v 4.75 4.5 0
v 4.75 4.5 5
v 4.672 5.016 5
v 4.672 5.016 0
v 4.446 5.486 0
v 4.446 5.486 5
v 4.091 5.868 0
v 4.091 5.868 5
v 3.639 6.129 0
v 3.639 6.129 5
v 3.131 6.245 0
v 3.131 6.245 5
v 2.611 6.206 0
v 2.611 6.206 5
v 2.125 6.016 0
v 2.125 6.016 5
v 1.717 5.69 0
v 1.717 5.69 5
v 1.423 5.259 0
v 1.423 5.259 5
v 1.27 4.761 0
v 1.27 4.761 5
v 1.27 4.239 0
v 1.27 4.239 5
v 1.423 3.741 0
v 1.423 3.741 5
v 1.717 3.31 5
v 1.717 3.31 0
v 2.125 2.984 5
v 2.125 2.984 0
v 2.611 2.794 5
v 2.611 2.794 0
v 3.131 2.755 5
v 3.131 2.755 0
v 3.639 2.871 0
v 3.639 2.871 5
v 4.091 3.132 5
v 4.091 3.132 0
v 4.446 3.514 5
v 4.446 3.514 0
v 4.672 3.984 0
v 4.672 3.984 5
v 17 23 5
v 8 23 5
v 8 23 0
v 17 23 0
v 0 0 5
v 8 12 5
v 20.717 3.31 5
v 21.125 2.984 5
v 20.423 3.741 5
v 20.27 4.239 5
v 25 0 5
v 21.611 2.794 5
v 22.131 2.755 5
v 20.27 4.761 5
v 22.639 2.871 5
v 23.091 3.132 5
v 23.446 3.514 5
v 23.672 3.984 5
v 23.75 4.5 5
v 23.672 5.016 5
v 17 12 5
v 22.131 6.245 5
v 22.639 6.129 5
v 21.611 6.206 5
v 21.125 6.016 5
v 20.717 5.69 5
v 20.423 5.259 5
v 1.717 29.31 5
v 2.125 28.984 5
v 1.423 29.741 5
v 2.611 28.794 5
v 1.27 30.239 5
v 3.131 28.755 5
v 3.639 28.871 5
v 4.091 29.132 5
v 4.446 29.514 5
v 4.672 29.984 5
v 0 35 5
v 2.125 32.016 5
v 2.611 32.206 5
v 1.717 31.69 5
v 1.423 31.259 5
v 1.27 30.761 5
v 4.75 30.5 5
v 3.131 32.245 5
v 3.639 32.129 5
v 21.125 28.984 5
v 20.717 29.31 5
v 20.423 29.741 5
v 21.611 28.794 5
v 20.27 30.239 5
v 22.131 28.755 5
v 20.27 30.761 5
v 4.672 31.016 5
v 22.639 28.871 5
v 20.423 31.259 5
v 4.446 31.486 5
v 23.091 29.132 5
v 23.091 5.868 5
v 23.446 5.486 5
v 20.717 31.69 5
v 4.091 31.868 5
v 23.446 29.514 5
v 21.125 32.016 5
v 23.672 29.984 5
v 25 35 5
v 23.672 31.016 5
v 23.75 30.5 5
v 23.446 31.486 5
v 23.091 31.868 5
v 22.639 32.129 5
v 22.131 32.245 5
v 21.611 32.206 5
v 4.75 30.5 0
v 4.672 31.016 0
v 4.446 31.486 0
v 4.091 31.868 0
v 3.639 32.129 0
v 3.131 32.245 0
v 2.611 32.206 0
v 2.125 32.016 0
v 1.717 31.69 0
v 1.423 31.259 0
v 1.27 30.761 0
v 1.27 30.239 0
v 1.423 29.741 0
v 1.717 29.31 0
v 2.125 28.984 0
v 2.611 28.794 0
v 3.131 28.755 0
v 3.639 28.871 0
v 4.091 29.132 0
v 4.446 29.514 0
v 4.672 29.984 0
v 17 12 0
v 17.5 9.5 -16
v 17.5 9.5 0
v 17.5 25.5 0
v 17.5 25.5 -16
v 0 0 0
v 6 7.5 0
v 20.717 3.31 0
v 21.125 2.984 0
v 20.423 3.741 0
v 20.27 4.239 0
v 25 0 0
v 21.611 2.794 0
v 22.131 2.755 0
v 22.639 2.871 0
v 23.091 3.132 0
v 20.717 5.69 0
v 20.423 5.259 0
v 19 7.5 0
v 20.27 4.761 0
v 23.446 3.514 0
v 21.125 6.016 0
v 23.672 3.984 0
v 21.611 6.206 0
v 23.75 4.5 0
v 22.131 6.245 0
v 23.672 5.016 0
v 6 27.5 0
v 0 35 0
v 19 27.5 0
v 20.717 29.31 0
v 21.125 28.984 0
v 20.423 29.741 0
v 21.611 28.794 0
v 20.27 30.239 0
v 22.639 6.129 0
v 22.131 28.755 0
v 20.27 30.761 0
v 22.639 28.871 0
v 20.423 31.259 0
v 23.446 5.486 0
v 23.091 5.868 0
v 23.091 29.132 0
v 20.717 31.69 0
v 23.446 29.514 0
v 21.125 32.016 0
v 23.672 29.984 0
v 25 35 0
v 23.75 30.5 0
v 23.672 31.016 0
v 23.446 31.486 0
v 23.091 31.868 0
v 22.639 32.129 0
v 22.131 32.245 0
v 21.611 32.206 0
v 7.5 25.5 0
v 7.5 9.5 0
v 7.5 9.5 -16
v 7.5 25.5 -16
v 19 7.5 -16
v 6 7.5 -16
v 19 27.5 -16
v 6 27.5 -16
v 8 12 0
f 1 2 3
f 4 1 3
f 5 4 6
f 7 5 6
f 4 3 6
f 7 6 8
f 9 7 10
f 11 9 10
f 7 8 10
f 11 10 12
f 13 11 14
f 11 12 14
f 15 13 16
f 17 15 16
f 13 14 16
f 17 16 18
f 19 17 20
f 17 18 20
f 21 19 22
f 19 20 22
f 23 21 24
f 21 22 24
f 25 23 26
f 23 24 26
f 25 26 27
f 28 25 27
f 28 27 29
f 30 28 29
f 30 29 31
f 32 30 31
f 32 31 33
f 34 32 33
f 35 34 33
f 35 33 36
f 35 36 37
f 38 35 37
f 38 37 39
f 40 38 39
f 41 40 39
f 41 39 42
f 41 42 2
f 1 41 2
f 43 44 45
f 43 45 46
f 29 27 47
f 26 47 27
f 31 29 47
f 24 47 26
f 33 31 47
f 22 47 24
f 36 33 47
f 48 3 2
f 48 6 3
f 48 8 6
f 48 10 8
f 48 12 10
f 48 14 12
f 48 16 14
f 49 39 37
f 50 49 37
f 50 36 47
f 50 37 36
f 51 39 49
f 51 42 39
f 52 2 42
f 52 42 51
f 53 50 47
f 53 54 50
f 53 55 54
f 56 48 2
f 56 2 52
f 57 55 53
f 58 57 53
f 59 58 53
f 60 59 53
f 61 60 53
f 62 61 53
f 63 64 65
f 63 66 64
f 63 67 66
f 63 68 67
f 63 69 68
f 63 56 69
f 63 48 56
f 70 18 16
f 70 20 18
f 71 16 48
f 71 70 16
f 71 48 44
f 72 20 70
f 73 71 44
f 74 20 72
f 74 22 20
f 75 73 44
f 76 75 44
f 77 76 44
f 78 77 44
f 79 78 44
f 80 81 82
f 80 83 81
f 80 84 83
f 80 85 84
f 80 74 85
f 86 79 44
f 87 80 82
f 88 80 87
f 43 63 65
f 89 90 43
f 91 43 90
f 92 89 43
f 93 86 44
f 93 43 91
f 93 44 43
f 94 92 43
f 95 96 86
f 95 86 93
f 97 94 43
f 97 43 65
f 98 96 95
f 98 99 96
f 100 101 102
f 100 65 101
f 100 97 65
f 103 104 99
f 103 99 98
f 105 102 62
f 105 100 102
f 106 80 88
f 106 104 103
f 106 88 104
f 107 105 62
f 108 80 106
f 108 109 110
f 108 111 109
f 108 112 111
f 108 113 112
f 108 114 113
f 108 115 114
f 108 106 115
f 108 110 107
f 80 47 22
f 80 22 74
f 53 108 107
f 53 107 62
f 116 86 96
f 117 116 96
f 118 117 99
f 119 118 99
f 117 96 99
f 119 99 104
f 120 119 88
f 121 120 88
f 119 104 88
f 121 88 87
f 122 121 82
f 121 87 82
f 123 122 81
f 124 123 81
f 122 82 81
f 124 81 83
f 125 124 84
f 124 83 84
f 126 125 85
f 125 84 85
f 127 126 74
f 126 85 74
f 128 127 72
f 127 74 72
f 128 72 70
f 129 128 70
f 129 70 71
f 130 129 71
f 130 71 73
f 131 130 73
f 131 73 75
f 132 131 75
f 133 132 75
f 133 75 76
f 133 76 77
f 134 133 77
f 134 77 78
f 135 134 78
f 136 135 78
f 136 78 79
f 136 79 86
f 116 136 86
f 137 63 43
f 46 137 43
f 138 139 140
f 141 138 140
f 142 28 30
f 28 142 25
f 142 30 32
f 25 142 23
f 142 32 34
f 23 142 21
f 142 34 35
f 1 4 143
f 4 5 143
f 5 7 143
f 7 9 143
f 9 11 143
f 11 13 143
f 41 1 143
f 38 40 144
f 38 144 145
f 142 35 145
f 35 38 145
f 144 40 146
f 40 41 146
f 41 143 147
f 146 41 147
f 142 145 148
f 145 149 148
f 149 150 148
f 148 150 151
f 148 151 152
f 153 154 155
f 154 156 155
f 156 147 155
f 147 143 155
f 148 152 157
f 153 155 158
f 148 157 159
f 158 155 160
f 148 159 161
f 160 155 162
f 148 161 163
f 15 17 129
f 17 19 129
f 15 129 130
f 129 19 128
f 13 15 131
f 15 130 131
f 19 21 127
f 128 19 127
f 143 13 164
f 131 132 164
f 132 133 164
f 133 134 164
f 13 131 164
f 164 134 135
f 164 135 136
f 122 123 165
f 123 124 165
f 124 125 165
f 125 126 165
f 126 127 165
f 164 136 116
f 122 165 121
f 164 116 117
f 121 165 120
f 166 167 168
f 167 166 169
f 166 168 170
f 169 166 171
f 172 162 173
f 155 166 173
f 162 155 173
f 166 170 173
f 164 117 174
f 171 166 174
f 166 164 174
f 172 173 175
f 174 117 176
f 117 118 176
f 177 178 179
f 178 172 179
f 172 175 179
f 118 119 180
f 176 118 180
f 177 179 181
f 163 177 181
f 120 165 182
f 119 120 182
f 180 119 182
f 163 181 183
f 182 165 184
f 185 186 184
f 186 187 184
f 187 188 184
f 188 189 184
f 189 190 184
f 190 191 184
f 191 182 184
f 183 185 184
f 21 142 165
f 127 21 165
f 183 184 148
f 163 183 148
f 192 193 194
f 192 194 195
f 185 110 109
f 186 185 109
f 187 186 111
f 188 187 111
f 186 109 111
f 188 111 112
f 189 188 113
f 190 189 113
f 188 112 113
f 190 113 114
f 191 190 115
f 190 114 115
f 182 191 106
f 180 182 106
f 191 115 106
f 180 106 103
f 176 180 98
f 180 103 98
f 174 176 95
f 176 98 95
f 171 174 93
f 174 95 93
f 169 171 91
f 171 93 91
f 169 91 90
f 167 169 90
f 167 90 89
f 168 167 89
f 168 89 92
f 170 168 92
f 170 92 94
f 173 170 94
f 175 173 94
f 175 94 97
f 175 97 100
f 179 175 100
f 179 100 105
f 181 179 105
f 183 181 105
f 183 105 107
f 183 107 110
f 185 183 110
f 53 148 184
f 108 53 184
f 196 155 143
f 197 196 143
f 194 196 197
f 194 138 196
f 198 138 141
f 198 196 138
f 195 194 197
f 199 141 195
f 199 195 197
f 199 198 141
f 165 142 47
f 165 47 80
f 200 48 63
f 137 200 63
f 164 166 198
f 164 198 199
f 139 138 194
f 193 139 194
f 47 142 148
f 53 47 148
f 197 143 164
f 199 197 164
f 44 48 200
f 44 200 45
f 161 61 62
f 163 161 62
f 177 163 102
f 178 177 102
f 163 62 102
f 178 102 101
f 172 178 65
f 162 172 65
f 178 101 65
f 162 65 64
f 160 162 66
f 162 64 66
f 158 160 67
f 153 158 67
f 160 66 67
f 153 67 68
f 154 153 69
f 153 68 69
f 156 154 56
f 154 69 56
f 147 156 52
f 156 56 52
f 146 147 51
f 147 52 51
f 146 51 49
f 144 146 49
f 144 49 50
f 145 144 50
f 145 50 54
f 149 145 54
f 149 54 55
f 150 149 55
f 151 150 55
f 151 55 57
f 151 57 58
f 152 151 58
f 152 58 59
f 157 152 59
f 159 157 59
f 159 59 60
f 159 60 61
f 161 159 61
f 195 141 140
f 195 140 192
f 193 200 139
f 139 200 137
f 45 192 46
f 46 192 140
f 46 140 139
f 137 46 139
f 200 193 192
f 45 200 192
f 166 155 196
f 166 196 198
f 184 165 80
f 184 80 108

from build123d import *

# Parameters (mm, degrees)
SKETCH1_W           = 25
SKETCH1_H           = 35
BOSS_EXTRUDE1_DEPTH = 5
SKETCH2_W           = 9
SKETCH2_H           = 11
CUT_EXTRUDE1_DEPTH  = 6
SKETCH3_R           = 1.75
CUT_EXTRUDE2_DEPTH  = 6
SKETCH4_W           = 13
SKETCH4_H           = 20
SKETCH4_W_2         = 10
SKETCH4_H_2         = 16
BOSS_EXTRUDE2_DEPTH = 16


with BuildPart() as part:
    # Sketch1 → Boss-Extrude1 (new body)
    with BuildSketch(Plane.XY):
        with Locations((12.5, 17.5)):
            Rectangle(SKETCH1_W, SKETCH1_H)
    extrude(amount=BOSS_EXTRUDE1_DEPTH)

    # Sketch2 → Cut-Extrude1 (cut, through all)
    with BuildSketch(Plane.XY.offset(5)):
        with Locations((12.5, 17.5)):
            Rectangle(SKETCH2_W, SKETCH2_H)
    extrude(amount=-CUT_EXTRUDE1_DEPTH, mode=Mode.SUBTRACT)

    # Sketch3 → Cut-Extrude2 (cut, through all)
    with BuildSketch(Plane.XY.offset(5)):
        with Locations((3, 30.5)):
            Circle(SKETCH3_R)
        with Locations((3, 4.5)):
            Circle(SKETCH3_R)
        with Locations((22, 4.5)):
            Circle(SKETCH3_R)
        with Locations((22, 30.5)):
            Circle(SKETCH3_R)
    extrude(amount=-CUT_EXTRUDE2_DEPTH, mode=Mode.SUBTRACT)

    # Sketch4 → Boss-Extrude2 (add)
    with BuildSketch(Plane(origin=(0, 0, 0), x_dir=(-1, 0, 0), z_dir=(0, 0, -1))):
        with Locations((-12.5, 17.5)):
            Rectangle(SKETCH4_W, SKETCH4_H)
        with Locations((-12.5, 17.5)):
            Rectangle(SKETCH4_W_2, SKETCH4_H_2, mode=Mode.SUBTRACT)
    extrude(amount=BOSS_EXTRUDE2_DEPTH)


solid = part.part
